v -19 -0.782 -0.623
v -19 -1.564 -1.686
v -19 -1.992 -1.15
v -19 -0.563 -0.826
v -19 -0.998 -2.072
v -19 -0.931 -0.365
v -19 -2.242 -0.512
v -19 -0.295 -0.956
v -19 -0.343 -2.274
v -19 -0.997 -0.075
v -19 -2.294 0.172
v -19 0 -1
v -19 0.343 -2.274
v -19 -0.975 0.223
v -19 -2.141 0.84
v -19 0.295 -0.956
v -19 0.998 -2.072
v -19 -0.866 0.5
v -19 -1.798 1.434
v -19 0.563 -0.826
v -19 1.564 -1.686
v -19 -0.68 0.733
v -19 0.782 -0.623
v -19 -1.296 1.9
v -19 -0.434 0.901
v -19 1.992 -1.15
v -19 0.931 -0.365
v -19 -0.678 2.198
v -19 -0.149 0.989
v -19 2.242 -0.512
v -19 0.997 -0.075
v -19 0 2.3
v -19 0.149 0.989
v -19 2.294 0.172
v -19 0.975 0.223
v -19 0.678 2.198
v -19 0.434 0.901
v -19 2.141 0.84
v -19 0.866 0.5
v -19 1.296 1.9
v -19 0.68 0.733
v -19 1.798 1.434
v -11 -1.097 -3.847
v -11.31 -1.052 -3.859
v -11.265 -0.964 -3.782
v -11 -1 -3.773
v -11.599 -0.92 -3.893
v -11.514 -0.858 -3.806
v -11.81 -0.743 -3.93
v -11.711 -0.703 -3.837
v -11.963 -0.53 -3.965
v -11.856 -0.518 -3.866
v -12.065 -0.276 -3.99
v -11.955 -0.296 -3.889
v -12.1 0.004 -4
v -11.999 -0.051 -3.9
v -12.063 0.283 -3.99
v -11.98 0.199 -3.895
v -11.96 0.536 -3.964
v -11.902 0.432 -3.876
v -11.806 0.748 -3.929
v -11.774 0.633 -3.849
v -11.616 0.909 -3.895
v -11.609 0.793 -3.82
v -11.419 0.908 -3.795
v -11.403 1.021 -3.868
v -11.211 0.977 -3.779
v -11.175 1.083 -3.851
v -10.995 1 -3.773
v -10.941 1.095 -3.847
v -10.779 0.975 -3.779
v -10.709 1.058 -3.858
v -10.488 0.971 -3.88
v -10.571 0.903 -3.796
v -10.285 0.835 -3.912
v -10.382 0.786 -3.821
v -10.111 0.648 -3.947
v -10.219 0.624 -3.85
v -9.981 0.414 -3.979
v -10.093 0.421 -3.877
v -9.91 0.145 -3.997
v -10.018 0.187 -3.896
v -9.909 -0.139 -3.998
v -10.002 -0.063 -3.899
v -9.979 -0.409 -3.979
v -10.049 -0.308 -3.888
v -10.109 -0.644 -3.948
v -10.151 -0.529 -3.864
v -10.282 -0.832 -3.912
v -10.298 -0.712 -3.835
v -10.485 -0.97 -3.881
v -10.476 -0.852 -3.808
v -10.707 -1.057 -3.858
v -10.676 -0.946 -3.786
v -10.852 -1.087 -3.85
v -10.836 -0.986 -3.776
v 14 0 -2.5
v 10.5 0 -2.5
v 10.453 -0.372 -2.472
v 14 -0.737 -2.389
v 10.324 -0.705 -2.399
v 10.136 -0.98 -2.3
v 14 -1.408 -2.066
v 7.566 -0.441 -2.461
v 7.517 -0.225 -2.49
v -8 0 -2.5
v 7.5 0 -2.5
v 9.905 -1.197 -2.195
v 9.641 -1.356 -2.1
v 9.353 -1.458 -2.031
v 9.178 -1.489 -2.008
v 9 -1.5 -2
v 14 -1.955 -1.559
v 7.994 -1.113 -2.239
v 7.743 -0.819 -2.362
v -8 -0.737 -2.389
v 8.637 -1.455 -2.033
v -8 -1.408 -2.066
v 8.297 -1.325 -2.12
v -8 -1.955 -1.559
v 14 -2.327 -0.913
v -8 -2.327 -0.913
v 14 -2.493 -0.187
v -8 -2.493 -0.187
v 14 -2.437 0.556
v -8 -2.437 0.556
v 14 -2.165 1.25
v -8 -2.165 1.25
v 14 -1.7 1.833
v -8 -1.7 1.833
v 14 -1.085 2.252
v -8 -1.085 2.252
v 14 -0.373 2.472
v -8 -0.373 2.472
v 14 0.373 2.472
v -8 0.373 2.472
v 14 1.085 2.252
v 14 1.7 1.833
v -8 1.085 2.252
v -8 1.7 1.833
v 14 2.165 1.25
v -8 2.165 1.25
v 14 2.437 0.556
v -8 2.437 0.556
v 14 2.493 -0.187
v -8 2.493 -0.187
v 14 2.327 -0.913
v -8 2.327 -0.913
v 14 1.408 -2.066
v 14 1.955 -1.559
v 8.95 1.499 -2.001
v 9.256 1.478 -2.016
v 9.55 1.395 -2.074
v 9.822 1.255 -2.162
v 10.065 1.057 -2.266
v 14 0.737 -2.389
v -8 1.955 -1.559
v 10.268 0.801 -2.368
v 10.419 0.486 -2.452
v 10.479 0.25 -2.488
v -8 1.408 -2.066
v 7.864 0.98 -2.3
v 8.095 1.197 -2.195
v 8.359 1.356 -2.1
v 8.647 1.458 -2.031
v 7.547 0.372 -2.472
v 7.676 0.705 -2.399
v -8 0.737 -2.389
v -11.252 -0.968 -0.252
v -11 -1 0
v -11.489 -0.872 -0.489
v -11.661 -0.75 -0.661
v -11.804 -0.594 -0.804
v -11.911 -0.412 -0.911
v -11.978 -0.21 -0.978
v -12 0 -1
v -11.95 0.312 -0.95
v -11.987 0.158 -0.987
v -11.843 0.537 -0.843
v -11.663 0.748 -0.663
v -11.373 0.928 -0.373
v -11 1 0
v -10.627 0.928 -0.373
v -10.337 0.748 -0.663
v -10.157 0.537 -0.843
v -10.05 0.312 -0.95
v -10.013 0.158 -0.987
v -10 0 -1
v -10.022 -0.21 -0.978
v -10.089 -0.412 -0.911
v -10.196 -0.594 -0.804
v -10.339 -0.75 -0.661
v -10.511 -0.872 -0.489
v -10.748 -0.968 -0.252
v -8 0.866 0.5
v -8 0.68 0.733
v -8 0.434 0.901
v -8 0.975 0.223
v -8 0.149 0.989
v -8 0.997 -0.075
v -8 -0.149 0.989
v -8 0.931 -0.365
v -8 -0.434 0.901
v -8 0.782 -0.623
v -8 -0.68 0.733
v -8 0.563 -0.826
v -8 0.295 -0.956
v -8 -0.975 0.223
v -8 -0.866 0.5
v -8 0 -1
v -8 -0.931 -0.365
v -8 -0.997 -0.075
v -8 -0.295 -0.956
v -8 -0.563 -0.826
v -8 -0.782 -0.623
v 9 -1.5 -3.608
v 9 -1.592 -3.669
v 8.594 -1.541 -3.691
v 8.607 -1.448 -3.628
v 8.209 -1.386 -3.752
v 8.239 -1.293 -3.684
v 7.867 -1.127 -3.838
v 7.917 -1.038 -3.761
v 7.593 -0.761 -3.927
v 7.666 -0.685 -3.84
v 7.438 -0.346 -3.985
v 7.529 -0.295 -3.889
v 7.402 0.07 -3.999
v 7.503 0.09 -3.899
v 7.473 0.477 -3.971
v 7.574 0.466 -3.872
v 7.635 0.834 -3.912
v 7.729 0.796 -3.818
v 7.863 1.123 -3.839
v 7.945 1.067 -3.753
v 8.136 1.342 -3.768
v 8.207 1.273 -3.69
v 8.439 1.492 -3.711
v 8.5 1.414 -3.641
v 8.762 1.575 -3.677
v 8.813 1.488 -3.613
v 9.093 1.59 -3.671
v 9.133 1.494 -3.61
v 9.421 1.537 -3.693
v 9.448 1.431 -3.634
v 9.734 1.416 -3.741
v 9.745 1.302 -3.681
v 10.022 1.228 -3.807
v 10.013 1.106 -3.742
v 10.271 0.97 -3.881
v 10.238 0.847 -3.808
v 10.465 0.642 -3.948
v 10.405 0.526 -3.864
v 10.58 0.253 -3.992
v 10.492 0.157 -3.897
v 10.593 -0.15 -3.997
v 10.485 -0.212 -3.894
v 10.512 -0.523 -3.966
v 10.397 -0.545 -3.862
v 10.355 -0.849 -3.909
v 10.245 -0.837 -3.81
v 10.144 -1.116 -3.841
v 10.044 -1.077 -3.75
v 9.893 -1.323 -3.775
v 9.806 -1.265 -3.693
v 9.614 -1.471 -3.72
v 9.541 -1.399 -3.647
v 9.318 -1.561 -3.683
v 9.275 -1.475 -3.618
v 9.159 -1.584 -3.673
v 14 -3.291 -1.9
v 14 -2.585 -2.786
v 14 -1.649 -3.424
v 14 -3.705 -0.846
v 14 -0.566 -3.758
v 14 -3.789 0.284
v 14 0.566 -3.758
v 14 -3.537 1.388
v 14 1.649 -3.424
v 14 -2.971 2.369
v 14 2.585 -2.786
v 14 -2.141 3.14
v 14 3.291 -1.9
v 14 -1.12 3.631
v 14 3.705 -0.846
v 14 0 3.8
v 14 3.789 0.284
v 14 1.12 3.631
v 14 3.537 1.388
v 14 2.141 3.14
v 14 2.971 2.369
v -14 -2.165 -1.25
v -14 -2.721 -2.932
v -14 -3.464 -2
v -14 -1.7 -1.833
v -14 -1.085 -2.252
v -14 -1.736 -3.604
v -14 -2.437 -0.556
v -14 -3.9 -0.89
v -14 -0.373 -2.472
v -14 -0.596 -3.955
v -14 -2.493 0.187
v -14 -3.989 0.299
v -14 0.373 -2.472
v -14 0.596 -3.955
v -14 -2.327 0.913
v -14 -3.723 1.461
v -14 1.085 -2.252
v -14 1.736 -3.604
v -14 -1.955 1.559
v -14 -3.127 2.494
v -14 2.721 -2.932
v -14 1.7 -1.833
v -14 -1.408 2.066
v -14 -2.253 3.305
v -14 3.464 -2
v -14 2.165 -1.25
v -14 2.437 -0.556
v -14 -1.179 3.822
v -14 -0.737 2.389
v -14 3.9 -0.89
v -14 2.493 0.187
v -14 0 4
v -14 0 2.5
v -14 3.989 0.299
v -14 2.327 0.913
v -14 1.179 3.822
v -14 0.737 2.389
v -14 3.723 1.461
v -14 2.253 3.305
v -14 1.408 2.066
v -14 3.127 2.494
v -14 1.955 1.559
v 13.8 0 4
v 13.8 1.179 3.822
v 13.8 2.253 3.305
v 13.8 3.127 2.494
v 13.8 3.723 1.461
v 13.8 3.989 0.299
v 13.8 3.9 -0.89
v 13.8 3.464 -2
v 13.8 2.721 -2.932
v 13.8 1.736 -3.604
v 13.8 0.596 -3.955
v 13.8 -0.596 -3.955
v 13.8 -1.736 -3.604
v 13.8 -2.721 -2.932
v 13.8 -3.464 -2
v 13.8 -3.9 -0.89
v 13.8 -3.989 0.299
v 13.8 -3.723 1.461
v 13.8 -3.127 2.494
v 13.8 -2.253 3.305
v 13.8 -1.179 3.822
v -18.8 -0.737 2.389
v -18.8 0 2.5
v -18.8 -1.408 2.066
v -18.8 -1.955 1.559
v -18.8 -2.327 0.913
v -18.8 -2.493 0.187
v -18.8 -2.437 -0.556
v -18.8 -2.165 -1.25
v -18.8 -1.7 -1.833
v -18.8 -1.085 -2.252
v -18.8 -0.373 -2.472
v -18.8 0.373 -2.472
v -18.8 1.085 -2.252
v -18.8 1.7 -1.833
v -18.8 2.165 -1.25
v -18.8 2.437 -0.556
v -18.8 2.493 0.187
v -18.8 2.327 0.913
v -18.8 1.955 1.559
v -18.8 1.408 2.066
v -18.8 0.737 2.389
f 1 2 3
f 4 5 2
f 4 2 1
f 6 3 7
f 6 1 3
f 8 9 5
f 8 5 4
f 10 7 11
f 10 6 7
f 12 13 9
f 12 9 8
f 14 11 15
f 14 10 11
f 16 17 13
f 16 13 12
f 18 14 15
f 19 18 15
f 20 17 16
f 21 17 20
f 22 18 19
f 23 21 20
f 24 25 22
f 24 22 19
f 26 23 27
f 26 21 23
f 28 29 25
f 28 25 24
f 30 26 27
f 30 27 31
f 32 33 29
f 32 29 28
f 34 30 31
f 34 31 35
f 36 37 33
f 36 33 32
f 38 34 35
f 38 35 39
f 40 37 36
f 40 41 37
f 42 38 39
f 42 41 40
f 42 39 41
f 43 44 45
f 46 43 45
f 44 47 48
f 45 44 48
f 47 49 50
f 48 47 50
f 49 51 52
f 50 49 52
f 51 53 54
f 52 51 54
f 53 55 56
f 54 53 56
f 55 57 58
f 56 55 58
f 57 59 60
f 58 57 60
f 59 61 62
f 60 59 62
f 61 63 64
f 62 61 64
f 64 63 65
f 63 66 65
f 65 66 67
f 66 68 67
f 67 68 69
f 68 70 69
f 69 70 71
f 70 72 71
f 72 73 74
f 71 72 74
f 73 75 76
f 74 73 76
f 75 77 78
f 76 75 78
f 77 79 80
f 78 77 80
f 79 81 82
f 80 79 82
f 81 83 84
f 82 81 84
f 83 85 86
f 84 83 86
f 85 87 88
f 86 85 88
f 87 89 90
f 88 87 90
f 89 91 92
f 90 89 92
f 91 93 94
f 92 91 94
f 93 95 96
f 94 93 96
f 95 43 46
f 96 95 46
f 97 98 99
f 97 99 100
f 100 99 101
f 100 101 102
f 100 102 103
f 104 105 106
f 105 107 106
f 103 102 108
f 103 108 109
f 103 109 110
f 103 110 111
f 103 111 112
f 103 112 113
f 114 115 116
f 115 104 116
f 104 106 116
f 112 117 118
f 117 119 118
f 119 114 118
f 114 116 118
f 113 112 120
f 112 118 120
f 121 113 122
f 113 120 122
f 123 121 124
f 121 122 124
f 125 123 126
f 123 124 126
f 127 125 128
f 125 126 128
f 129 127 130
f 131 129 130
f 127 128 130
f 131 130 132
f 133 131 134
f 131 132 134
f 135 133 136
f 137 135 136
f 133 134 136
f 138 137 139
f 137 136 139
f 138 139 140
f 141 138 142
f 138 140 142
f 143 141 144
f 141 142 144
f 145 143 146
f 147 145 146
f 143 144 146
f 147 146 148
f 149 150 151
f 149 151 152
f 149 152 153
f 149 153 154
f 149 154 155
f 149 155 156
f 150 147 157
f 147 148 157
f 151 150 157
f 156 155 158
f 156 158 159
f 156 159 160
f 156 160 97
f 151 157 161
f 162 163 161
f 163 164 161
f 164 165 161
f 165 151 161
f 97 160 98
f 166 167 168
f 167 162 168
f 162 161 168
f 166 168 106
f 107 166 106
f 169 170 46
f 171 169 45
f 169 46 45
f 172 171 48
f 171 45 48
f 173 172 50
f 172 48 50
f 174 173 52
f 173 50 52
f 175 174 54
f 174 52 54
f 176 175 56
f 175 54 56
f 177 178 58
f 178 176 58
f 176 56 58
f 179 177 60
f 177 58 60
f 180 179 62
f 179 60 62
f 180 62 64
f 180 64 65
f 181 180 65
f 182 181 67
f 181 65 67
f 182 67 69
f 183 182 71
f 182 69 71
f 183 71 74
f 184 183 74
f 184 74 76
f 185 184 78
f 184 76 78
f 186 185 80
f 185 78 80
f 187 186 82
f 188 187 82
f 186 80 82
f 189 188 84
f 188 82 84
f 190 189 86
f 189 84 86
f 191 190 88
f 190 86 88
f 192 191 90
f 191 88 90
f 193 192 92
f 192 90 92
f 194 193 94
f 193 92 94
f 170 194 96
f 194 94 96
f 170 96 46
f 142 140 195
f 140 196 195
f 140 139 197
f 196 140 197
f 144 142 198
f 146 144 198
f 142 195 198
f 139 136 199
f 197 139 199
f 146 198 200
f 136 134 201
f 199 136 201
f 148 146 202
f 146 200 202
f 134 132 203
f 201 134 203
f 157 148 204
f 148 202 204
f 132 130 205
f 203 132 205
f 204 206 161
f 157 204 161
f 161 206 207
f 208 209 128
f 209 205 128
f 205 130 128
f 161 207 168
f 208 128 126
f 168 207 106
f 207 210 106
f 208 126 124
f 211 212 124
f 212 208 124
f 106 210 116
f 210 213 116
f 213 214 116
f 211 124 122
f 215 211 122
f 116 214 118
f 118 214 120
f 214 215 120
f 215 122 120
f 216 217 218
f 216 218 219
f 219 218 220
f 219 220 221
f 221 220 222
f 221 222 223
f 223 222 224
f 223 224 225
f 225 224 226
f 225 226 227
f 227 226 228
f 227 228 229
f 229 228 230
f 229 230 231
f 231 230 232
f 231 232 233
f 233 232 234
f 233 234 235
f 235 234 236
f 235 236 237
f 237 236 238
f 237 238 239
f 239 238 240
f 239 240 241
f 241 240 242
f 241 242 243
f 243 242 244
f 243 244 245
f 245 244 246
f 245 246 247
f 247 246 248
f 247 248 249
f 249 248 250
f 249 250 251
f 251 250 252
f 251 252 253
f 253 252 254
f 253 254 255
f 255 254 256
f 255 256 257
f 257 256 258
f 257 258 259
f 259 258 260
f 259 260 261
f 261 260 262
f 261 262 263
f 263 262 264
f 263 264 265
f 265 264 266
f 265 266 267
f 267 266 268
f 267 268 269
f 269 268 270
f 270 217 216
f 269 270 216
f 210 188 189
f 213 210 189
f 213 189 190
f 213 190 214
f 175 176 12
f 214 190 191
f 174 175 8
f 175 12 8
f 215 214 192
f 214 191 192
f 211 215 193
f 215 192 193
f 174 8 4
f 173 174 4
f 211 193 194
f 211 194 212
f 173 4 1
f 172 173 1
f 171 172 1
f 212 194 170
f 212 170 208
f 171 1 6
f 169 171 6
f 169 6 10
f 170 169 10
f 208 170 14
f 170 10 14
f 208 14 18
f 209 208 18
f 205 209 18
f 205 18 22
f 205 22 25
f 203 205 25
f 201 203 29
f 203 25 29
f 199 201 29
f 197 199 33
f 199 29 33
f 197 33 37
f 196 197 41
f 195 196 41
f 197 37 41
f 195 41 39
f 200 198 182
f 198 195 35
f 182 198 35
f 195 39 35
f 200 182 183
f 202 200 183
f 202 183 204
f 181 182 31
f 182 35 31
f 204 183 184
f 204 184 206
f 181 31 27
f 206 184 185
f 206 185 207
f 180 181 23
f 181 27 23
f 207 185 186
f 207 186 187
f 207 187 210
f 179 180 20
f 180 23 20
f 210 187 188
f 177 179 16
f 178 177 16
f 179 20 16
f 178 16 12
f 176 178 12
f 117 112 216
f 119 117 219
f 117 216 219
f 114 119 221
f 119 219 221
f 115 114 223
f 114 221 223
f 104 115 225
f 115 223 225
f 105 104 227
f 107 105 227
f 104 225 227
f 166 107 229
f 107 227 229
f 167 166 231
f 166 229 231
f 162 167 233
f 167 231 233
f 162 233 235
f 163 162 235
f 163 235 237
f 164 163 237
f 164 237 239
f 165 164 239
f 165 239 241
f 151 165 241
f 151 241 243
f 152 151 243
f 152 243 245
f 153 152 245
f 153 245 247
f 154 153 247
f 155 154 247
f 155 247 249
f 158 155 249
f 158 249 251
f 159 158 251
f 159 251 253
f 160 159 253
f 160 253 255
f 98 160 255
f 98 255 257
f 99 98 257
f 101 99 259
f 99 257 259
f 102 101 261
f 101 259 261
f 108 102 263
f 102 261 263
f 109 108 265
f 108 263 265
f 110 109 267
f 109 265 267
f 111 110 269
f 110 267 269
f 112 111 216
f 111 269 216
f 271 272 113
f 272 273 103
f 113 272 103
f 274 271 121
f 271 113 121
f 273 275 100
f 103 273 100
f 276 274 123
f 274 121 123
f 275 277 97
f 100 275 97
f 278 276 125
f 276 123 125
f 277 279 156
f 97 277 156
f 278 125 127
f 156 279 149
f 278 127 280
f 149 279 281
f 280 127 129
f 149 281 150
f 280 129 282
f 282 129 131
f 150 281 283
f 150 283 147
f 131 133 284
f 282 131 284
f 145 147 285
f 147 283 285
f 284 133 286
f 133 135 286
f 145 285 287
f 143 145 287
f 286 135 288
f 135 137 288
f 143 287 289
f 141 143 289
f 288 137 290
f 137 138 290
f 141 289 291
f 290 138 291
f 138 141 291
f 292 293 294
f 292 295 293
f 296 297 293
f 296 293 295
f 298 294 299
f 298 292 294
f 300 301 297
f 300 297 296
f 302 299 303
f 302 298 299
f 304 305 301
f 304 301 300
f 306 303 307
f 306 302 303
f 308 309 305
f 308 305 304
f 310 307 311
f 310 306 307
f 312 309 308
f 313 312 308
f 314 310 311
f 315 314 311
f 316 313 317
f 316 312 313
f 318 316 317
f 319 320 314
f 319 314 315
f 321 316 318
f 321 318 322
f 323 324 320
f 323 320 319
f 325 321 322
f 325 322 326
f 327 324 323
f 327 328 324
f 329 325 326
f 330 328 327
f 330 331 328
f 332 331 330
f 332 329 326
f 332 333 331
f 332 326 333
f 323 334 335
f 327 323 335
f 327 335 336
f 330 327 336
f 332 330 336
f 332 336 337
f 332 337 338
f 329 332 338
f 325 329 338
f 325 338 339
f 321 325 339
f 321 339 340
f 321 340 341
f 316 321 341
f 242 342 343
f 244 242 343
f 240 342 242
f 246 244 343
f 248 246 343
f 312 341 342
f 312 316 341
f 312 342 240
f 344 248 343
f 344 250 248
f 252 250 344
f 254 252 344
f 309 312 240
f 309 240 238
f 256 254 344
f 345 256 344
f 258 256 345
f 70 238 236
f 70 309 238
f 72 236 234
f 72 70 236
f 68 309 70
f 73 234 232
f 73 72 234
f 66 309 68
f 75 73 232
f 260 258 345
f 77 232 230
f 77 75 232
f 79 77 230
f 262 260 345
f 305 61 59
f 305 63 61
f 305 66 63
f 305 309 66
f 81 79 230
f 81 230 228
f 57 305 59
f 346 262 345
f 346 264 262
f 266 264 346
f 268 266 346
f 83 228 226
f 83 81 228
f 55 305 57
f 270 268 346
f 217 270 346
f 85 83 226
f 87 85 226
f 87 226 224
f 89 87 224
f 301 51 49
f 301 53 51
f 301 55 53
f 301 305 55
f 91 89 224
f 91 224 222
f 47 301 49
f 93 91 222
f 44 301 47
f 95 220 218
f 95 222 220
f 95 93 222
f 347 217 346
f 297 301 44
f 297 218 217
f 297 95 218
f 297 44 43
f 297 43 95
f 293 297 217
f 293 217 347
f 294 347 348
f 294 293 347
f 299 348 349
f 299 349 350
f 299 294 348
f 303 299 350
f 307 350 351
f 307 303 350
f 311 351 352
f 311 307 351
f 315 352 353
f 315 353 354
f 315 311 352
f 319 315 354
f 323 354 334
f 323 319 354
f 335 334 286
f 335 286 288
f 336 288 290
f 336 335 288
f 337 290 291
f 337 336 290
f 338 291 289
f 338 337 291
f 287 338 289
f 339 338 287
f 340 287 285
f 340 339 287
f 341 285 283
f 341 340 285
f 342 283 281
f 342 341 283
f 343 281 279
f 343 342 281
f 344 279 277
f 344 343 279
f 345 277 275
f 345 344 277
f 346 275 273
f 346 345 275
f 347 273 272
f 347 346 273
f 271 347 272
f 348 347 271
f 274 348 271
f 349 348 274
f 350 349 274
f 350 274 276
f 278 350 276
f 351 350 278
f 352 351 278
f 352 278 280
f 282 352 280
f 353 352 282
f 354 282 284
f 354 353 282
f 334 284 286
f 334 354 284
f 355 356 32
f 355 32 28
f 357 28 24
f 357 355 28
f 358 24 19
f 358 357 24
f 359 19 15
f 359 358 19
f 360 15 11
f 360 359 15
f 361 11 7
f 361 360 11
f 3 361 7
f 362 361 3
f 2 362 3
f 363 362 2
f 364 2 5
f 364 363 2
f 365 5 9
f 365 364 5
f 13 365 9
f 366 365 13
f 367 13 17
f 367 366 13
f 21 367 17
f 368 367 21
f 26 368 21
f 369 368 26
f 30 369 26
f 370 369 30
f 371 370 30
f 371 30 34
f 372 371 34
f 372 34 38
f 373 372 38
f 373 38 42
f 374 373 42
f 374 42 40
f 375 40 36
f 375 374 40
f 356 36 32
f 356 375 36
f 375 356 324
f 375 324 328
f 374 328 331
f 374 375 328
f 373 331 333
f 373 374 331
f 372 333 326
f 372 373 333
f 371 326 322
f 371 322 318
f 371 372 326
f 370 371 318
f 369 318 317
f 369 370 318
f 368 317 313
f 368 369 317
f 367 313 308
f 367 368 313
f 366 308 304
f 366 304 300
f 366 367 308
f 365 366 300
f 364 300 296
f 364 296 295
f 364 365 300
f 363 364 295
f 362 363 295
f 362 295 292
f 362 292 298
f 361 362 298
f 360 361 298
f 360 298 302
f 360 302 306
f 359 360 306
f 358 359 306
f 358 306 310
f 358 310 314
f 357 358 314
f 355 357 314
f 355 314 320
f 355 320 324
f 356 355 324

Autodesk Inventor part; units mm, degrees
ref_plane "YZ Plane" through (0, 0, 0) normal (1, 0, 0) x (0, 1, 0)
ref_plane "XZ Plane" through (0, 0, 0) normal (0, 1, 0) x (-1, 0, 0)
ref_plane "XY Plane" through (0, 0, 0) normal (0, 0, 1) x (1, 0, 0)
sketch "Skizze3" plane through (0, 0, 0) normal (0, 1, 0) x (-1, 0, 0)
  line L0 (-27.6589, 0) -> (27.6589, 0)
  line L1 (-14, 0) -> (-14, 4)
  line L2 (-14, 4) -> (14, 4)
  line L3 (14, 4) -> (14, 2.5)
  line L4 (14, 2.5) -> (19, 2.5)
  line L5 (19, 2.5) -> (19, 0)
  point P0 (0, 0)
  point P1 (0, 0)
  point P2 (14, 3.25)
  point P3 (0, 4)
  dimension "d4" = 8
  dimension "d5" = 5
  dimension "d6" = 5
  dimension "d7" = 28
revolve "Umdrehung1" add sketch "Skizze3" angle 360 about axis through (27.6589, 0, 0) along (-1, 0, 0)
sketch "Skizze4" plane through (14, 0, 0) normal (1, 0, 0) x (0, 0, -1)
  circle A0 centre (0, 0) radius 4 projected
  point P0 (0, 0)
hole "Bohrung1" at (14, 0, 0) direction (-1, 0, 0) diameter 5 depth 22
hole "Bohrung2" at (14, 0, 0) direction (-1, 0, 0) diameter 2 depth 40
sketch "Skizze5" plane through (0, 0, 0) normal (0, 0, 1) x (1, 0, 0)
  line L0 (14, 4) -> (14, -4) projected
  line L1 (-19, 2.5) -> (-19, -2.5) projected
  line L2 (14, 0) -> (-19.3712, 0)
  line L3 (-14, 4) -> (-14, -4) projected
  point P0 (0, 0)
  point P1 (9, 0)
  point P2 (-11, 0)
  dimension "d23" = 3
  dimension "d24" = 5
hole "Bohrung3" at (-11, 0, 0) direction (0, 0, -1) diameter 2 depth 5
hole "Bohrung4" at (9, 0, 0) direction (0, 0, -1) diameter 3 depth 4
thread "Gewinde1" size "M2x0.4" class "6H" standard "ISO Metric profile" length 8
thread "Gewinde2" size "M3x0.5" class "6H" standard "ISO Metric profile" length 8
chamfer "Fase1" distance 0.1 angle 45 4 edges at (9.9974, -1.1203, -3.8399) (9.0005, 1.5, -3.7081) (8.0025, -1.1203, -3.8399) (-11.0007, 1, -3.873)
chamfer "Fase2" distance 0.2 angle 45 2 edges at (14, 0, -4) (-19, 0, -2.5)
properties part number "BT805_goteln20_22" material "Messing"
